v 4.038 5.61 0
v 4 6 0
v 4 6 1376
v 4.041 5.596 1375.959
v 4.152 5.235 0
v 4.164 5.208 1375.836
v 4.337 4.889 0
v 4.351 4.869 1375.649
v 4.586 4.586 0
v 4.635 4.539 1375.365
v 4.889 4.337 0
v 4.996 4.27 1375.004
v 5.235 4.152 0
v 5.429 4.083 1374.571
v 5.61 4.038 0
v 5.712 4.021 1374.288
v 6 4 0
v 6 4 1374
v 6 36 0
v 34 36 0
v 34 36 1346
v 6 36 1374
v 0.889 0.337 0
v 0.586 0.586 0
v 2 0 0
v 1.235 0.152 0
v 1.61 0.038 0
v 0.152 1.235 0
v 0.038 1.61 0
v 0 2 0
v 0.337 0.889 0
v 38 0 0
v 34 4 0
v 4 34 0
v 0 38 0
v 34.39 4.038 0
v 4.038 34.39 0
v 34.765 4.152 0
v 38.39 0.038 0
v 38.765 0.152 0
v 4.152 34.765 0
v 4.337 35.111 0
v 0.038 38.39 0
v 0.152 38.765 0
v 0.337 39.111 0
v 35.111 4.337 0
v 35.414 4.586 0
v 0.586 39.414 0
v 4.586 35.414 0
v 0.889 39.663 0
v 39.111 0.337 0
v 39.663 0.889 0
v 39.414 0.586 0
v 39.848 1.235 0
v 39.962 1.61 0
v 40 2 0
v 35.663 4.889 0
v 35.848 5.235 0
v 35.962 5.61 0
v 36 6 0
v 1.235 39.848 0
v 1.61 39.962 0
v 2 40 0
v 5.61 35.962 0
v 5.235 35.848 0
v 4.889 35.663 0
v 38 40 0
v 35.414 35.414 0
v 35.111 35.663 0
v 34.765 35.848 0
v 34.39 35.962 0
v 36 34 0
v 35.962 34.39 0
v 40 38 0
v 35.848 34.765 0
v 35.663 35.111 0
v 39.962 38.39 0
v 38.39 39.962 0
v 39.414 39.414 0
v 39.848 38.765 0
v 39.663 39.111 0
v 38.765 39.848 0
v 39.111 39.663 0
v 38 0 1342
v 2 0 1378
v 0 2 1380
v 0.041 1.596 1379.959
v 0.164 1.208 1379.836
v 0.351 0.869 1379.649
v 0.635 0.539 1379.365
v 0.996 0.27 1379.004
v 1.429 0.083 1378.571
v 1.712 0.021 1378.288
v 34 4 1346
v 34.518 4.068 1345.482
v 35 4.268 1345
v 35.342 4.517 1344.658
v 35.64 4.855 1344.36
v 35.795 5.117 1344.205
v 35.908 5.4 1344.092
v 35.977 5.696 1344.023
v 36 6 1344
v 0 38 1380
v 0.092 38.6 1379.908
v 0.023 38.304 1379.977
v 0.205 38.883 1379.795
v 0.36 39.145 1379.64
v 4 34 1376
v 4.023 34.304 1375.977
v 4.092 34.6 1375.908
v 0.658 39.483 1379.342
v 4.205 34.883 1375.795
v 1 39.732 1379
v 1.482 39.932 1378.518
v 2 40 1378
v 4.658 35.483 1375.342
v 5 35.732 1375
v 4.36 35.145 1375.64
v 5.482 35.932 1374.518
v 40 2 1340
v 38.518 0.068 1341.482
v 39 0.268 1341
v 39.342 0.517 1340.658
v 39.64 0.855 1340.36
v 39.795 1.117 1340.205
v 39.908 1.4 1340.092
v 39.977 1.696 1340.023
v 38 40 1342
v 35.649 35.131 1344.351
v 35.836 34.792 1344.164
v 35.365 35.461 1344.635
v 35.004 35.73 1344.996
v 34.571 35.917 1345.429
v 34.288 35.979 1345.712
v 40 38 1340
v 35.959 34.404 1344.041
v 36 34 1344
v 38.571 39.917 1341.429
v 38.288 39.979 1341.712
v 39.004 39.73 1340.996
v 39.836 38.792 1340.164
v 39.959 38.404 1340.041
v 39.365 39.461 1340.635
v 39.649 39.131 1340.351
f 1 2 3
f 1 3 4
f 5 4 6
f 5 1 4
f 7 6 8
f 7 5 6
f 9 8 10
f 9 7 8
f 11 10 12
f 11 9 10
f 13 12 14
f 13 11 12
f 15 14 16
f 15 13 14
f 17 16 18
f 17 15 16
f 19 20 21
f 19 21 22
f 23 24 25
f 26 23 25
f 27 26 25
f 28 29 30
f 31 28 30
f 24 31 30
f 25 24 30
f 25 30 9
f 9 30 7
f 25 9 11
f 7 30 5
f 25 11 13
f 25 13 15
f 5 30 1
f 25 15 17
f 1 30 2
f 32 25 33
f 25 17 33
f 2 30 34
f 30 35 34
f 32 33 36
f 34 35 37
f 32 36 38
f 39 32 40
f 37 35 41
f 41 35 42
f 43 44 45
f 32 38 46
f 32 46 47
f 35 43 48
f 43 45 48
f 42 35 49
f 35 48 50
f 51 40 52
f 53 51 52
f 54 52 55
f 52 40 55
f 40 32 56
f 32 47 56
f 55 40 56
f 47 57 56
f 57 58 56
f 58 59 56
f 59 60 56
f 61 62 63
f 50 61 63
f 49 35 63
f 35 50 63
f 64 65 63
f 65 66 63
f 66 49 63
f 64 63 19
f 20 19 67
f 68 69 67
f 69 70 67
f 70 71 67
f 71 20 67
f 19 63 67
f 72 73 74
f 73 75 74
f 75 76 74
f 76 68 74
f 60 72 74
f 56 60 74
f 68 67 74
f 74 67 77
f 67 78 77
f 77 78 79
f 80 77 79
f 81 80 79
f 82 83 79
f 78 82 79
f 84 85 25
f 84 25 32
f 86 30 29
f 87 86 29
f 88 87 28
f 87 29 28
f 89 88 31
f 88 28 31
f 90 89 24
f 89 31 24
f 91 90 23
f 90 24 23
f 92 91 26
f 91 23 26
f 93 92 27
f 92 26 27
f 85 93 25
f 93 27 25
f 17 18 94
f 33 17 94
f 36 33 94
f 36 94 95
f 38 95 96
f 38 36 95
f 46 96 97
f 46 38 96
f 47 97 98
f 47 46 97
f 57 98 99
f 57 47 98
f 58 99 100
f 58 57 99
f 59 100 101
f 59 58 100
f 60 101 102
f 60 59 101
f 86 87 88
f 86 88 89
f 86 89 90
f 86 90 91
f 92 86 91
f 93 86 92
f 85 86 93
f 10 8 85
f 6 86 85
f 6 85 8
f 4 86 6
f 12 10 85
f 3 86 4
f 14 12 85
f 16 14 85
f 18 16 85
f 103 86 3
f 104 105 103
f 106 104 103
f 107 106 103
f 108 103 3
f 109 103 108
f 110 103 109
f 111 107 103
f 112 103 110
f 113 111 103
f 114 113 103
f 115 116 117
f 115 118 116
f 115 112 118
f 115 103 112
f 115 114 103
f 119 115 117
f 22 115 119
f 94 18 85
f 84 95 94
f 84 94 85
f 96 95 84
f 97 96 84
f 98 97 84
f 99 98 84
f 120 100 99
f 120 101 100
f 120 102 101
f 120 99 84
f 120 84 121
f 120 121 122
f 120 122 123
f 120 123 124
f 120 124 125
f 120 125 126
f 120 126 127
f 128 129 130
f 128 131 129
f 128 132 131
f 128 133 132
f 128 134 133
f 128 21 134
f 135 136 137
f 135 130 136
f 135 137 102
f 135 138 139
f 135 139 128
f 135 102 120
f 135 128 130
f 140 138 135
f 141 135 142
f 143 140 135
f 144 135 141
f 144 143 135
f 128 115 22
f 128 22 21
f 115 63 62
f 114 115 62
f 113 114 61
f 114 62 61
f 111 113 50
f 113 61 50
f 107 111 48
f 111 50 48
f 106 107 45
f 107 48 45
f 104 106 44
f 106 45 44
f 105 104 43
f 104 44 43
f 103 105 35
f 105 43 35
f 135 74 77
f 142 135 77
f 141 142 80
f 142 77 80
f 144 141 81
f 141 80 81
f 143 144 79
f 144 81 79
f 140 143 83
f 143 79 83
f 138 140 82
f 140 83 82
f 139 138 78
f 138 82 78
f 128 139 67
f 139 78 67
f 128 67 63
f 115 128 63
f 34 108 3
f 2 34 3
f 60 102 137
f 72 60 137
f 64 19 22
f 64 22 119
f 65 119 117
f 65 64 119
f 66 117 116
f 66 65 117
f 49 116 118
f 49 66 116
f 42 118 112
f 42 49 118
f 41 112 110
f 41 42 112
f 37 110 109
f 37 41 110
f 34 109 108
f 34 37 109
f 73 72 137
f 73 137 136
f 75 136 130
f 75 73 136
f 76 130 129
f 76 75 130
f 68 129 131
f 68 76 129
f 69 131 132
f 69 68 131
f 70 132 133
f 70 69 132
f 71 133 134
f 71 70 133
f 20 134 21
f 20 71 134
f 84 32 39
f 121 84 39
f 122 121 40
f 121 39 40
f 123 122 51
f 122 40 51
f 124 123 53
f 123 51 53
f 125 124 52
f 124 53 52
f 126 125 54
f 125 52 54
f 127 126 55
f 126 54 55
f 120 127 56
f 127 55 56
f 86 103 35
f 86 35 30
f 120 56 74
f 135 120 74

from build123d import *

# Parameters (mm, degrees)
BOSS_EXTRU_1_DEPTH      = 1380
ENL_V_MAT_EXTRU_1_DEPTH = 70


with BuildPart() as part:
    # Esquisse2 → Boss.-Extru.1 (new body)
    with BuildSketch(Plane.XY):
        with BuildLine():
            Line((2, 0), (38, 0))
            ThreePointArc((38, 0), (39.414213562, 0.585786438), (40, 2))
            Line((40, 2), (40, 38))
            ThreePointArc((40, 38), (39.414213562, 39.414213562), (38, 40))
            Line((38, 40), (2, 40))
            ThreePointArc((2, 40), (0.585786438, 39.414213562), (0, 38))
            Line((0, 38), (0, 2))
            ThreePointArc((0, 2), (0.585786438, 0.585786438), (2, 0))
        make_face()
        with BuildLine():
            Line((6, 4), (34, 4))
            ThreePointArc((34, 4), (35.414213562, 4.585786438), (36, 6))
            Line((36, 6), (36, 34))
            ThreePointArc((36, 34), (35.414213562, 35.414213562), (34, 36))
            Line((34, 36), (6, 36))
            ThreePointArc((6, 36), (4.585786438, 35.414213562), (4, 34))
            Line((4, 34), (4, 6))
            ThreePointArc((4, 6), (4.585786438, 4.585786438), (6, 4))
        make_face(mode=Mode.SUBTRACT)
    extrude(amount=BOSS_EXTRU_1_DEPTH)

    # Esquisse3 → Enlèv. mat.-Extru.1 (cut)
    with BuildSketch(Plane(origin=(0, 40, 0), x_dir=(1, 0, 0), z_dir=(0, 1, 0))):
        Polygon((0, -1380), (40, -1340), (40, -1380), align=None)
    extrude(amount=-ENL_V_MAT_EXTRU_1_DEPTH, mode=Mode.SUBTRACT)


solid = part.part
